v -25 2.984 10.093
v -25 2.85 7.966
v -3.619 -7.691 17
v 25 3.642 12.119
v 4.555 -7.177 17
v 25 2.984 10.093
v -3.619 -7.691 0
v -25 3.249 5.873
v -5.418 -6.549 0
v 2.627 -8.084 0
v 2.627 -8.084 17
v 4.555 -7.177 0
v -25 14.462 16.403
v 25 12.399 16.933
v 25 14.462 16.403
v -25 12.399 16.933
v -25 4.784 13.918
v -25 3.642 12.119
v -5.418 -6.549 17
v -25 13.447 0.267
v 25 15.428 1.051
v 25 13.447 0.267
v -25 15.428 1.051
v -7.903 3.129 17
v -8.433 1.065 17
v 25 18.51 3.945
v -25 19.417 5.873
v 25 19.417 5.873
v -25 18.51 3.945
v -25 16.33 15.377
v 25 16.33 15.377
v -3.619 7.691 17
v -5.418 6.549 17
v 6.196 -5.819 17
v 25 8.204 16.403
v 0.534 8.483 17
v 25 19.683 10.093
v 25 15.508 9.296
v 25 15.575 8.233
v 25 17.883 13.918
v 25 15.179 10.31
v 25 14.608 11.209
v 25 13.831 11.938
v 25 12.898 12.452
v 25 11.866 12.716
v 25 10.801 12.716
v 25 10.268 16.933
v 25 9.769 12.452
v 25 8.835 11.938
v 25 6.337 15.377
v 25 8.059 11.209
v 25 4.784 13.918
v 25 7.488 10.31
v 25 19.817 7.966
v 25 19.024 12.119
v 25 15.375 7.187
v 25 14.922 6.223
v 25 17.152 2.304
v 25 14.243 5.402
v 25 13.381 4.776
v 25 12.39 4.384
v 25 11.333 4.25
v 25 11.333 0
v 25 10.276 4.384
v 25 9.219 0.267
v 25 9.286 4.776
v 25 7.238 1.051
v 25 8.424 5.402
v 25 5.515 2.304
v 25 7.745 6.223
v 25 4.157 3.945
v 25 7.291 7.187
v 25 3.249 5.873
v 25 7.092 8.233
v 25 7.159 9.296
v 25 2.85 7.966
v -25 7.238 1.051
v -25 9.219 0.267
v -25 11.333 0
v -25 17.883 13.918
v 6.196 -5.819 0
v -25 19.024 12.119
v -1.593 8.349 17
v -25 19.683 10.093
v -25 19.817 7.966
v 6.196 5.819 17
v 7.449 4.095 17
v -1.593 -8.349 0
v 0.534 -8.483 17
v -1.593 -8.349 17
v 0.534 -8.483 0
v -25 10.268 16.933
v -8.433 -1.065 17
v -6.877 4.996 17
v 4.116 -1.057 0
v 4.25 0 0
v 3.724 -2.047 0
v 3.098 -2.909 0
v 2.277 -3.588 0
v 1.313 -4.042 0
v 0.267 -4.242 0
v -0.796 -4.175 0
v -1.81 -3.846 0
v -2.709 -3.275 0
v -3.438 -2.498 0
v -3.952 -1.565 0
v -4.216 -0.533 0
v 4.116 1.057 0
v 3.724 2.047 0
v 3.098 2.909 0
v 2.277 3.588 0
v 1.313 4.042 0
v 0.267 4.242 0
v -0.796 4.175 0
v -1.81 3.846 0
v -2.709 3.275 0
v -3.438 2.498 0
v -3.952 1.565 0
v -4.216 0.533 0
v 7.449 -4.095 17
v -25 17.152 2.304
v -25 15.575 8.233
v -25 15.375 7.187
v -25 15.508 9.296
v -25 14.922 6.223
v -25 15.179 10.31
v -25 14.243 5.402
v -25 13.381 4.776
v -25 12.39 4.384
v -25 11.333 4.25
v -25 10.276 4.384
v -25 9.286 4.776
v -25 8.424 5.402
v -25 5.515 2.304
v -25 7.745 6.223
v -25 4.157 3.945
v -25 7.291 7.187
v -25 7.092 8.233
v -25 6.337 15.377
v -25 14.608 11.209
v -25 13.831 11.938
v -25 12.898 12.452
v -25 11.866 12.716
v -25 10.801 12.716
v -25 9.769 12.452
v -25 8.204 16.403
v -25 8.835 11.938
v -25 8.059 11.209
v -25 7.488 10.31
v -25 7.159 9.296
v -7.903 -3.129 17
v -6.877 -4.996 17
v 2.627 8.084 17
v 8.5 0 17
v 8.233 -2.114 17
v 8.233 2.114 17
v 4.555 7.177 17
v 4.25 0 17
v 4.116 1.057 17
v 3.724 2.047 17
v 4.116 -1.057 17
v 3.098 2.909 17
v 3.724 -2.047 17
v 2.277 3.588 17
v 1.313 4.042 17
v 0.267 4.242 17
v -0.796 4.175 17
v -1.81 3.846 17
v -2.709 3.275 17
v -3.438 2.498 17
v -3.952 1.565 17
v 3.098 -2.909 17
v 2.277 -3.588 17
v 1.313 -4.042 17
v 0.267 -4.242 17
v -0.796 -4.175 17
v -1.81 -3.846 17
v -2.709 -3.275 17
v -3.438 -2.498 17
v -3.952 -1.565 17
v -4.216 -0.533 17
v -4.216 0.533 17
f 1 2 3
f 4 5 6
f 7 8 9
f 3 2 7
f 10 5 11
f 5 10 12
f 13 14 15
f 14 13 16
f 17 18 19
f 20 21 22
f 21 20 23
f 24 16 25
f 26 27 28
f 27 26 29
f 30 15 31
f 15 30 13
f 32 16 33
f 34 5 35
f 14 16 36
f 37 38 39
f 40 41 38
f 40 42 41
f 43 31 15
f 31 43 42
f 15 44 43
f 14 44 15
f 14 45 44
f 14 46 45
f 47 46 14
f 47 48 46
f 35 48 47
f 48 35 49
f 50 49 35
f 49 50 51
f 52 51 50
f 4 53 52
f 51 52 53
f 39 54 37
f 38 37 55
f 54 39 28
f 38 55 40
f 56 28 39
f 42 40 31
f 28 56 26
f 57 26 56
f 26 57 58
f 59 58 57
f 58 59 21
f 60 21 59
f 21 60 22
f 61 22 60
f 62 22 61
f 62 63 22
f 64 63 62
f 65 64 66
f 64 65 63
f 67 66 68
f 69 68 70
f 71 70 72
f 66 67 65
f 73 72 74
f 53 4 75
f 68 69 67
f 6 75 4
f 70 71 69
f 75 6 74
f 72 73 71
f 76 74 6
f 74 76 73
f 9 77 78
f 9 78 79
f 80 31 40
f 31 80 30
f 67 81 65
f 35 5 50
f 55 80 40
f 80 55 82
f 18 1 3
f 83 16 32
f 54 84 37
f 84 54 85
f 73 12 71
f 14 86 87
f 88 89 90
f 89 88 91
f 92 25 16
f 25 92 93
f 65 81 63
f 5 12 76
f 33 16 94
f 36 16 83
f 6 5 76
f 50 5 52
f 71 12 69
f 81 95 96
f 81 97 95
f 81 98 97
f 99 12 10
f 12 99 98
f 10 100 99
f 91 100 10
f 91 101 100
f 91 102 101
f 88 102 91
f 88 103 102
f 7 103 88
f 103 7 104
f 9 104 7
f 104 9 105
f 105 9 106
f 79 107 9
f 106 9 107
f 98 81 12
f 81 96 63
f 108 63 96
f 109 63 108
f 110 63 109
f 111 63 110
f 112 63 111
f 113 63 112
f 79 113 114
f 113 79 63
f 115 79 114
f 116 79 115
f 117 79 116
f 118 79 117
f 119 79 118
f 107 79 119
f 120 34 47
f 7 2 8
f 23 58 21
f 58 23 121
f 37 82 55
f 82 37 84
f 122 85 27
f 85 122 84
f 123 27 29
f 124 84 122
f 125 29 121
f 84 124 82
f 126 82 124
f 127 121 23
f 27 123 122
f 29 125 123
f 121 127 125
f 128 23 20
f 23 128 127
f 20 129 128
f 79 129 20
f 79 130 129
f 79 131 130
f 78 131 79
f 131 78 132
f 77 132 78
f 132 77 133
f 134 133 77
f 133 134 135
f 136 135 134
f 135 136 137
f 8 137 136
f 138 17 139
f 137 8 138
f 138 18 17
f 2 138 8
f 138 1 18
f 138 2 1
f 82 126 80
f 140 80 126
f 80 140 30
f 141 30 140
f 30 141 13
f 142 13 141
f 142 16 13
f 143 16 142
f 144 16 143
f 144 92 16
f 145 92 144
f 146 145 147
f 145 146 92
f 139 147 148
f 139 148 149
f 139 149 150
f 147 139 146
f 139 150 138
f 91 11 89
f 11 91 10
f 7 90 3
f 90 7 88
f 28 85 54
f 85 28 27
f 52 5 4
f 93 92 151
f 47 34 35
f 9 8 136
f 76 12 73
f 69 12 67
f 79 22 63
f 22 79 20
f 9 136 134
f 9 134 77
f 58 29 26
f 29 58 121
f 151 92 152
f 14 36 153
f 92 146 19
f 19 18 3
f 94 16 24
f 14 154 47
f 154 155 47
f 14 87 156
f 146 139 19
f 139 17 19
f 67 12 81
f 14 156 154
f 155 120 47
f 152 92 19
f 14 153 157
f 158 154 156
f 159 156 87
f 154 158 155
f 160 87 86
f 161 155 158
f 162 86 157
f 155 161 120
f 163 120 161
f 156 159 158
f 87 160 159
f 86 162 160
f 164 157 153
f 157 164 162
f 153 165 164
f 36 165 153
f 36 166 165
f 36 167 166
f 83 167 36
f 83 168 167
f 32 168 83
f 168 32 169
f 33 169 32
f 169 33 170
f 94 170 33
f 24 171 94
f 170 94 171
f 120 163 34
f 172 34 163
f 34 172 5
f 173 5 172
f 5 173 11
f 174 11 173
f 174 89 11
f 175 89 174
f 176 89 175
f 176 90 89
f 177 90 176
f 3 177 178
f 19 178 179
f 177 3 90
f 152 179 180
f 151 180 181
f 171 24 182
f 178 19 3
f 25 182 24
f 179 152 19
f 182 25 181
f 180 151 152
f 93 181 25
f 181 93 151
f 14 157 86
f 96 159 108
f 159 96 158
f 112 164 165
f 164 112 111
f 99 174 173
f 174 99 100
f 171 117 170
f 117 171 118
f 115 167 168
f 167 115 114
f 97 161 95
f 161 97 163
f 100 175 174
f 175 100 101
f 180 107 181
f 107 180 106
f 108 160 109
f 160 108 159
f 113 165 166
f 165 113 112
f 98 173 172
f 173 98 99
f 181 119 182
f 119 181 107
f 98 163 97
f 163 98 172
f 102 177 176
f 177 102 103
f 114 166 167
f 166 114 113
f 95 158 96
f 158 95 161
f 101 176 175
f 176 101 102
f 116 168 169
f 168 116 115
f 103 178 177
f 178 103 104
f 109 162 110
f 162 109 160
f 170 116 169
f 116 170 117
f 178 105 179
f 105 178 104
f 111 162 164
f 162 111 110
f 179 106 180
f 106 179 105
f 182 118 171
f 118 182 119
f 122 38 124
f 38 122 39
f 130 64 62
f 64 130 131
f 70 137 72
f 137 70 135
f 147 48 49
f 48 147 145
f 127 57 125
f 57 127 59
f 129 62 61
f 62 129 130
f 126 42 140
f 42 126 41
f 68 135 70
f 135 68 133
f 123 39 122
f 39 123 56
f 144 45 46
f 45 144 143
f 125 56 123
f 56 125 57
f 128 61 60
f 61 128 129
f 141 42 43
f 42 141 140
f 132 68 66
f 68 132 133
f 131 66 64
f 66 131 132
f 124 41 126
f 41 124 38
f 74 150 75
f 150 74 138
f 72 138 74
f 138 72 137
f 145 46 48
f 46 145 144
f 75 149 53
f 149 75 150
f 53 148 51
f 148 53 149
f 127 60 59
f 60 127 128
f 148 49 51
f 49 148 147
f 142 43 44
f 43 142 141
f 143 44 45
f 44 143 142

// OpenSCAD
$fn = 25;

stud_clear_dia = 8.5;
washer_dia = 17;
thk = washer_dia;
wide_width = 50;

module hollow_cylinder(id,od,height)
{
    difference()
    {
        cylinder(d=od,h=height);
        cylinder(d=id,h=height);
    }
    
}

//outers
difference()
{
    hull()
    {
        //vertical cylinder
        cylinder(d=washer_dia,h=thk);
         
     //horizontal cylinder   
        translate([-wide_width/2,washer_dia*(2/3),thk/2])
            rotate([0,90,0])
                cylinder(d=washer_dia,h=wide_width);
    }

//holes
cylinder(d=stud_clear_dia,h=thk);
translate([-wide_width/2,washer_dia*(2/3),thk/2])
    rotate([0,90,0])
        cylinder(d=stud_clear_dia,h=wide_width);
}
/*
hollow_cylinder(id=stud_clear_dia, od=washer_dia, height=thk);
translate([-thk/2,washer_dia*(2/3),thk/2])
    rotate([0,90,0])
        hollow_cylinder(id=stud_clear_dia, od=washer_dia, height=thk);
*/
    
